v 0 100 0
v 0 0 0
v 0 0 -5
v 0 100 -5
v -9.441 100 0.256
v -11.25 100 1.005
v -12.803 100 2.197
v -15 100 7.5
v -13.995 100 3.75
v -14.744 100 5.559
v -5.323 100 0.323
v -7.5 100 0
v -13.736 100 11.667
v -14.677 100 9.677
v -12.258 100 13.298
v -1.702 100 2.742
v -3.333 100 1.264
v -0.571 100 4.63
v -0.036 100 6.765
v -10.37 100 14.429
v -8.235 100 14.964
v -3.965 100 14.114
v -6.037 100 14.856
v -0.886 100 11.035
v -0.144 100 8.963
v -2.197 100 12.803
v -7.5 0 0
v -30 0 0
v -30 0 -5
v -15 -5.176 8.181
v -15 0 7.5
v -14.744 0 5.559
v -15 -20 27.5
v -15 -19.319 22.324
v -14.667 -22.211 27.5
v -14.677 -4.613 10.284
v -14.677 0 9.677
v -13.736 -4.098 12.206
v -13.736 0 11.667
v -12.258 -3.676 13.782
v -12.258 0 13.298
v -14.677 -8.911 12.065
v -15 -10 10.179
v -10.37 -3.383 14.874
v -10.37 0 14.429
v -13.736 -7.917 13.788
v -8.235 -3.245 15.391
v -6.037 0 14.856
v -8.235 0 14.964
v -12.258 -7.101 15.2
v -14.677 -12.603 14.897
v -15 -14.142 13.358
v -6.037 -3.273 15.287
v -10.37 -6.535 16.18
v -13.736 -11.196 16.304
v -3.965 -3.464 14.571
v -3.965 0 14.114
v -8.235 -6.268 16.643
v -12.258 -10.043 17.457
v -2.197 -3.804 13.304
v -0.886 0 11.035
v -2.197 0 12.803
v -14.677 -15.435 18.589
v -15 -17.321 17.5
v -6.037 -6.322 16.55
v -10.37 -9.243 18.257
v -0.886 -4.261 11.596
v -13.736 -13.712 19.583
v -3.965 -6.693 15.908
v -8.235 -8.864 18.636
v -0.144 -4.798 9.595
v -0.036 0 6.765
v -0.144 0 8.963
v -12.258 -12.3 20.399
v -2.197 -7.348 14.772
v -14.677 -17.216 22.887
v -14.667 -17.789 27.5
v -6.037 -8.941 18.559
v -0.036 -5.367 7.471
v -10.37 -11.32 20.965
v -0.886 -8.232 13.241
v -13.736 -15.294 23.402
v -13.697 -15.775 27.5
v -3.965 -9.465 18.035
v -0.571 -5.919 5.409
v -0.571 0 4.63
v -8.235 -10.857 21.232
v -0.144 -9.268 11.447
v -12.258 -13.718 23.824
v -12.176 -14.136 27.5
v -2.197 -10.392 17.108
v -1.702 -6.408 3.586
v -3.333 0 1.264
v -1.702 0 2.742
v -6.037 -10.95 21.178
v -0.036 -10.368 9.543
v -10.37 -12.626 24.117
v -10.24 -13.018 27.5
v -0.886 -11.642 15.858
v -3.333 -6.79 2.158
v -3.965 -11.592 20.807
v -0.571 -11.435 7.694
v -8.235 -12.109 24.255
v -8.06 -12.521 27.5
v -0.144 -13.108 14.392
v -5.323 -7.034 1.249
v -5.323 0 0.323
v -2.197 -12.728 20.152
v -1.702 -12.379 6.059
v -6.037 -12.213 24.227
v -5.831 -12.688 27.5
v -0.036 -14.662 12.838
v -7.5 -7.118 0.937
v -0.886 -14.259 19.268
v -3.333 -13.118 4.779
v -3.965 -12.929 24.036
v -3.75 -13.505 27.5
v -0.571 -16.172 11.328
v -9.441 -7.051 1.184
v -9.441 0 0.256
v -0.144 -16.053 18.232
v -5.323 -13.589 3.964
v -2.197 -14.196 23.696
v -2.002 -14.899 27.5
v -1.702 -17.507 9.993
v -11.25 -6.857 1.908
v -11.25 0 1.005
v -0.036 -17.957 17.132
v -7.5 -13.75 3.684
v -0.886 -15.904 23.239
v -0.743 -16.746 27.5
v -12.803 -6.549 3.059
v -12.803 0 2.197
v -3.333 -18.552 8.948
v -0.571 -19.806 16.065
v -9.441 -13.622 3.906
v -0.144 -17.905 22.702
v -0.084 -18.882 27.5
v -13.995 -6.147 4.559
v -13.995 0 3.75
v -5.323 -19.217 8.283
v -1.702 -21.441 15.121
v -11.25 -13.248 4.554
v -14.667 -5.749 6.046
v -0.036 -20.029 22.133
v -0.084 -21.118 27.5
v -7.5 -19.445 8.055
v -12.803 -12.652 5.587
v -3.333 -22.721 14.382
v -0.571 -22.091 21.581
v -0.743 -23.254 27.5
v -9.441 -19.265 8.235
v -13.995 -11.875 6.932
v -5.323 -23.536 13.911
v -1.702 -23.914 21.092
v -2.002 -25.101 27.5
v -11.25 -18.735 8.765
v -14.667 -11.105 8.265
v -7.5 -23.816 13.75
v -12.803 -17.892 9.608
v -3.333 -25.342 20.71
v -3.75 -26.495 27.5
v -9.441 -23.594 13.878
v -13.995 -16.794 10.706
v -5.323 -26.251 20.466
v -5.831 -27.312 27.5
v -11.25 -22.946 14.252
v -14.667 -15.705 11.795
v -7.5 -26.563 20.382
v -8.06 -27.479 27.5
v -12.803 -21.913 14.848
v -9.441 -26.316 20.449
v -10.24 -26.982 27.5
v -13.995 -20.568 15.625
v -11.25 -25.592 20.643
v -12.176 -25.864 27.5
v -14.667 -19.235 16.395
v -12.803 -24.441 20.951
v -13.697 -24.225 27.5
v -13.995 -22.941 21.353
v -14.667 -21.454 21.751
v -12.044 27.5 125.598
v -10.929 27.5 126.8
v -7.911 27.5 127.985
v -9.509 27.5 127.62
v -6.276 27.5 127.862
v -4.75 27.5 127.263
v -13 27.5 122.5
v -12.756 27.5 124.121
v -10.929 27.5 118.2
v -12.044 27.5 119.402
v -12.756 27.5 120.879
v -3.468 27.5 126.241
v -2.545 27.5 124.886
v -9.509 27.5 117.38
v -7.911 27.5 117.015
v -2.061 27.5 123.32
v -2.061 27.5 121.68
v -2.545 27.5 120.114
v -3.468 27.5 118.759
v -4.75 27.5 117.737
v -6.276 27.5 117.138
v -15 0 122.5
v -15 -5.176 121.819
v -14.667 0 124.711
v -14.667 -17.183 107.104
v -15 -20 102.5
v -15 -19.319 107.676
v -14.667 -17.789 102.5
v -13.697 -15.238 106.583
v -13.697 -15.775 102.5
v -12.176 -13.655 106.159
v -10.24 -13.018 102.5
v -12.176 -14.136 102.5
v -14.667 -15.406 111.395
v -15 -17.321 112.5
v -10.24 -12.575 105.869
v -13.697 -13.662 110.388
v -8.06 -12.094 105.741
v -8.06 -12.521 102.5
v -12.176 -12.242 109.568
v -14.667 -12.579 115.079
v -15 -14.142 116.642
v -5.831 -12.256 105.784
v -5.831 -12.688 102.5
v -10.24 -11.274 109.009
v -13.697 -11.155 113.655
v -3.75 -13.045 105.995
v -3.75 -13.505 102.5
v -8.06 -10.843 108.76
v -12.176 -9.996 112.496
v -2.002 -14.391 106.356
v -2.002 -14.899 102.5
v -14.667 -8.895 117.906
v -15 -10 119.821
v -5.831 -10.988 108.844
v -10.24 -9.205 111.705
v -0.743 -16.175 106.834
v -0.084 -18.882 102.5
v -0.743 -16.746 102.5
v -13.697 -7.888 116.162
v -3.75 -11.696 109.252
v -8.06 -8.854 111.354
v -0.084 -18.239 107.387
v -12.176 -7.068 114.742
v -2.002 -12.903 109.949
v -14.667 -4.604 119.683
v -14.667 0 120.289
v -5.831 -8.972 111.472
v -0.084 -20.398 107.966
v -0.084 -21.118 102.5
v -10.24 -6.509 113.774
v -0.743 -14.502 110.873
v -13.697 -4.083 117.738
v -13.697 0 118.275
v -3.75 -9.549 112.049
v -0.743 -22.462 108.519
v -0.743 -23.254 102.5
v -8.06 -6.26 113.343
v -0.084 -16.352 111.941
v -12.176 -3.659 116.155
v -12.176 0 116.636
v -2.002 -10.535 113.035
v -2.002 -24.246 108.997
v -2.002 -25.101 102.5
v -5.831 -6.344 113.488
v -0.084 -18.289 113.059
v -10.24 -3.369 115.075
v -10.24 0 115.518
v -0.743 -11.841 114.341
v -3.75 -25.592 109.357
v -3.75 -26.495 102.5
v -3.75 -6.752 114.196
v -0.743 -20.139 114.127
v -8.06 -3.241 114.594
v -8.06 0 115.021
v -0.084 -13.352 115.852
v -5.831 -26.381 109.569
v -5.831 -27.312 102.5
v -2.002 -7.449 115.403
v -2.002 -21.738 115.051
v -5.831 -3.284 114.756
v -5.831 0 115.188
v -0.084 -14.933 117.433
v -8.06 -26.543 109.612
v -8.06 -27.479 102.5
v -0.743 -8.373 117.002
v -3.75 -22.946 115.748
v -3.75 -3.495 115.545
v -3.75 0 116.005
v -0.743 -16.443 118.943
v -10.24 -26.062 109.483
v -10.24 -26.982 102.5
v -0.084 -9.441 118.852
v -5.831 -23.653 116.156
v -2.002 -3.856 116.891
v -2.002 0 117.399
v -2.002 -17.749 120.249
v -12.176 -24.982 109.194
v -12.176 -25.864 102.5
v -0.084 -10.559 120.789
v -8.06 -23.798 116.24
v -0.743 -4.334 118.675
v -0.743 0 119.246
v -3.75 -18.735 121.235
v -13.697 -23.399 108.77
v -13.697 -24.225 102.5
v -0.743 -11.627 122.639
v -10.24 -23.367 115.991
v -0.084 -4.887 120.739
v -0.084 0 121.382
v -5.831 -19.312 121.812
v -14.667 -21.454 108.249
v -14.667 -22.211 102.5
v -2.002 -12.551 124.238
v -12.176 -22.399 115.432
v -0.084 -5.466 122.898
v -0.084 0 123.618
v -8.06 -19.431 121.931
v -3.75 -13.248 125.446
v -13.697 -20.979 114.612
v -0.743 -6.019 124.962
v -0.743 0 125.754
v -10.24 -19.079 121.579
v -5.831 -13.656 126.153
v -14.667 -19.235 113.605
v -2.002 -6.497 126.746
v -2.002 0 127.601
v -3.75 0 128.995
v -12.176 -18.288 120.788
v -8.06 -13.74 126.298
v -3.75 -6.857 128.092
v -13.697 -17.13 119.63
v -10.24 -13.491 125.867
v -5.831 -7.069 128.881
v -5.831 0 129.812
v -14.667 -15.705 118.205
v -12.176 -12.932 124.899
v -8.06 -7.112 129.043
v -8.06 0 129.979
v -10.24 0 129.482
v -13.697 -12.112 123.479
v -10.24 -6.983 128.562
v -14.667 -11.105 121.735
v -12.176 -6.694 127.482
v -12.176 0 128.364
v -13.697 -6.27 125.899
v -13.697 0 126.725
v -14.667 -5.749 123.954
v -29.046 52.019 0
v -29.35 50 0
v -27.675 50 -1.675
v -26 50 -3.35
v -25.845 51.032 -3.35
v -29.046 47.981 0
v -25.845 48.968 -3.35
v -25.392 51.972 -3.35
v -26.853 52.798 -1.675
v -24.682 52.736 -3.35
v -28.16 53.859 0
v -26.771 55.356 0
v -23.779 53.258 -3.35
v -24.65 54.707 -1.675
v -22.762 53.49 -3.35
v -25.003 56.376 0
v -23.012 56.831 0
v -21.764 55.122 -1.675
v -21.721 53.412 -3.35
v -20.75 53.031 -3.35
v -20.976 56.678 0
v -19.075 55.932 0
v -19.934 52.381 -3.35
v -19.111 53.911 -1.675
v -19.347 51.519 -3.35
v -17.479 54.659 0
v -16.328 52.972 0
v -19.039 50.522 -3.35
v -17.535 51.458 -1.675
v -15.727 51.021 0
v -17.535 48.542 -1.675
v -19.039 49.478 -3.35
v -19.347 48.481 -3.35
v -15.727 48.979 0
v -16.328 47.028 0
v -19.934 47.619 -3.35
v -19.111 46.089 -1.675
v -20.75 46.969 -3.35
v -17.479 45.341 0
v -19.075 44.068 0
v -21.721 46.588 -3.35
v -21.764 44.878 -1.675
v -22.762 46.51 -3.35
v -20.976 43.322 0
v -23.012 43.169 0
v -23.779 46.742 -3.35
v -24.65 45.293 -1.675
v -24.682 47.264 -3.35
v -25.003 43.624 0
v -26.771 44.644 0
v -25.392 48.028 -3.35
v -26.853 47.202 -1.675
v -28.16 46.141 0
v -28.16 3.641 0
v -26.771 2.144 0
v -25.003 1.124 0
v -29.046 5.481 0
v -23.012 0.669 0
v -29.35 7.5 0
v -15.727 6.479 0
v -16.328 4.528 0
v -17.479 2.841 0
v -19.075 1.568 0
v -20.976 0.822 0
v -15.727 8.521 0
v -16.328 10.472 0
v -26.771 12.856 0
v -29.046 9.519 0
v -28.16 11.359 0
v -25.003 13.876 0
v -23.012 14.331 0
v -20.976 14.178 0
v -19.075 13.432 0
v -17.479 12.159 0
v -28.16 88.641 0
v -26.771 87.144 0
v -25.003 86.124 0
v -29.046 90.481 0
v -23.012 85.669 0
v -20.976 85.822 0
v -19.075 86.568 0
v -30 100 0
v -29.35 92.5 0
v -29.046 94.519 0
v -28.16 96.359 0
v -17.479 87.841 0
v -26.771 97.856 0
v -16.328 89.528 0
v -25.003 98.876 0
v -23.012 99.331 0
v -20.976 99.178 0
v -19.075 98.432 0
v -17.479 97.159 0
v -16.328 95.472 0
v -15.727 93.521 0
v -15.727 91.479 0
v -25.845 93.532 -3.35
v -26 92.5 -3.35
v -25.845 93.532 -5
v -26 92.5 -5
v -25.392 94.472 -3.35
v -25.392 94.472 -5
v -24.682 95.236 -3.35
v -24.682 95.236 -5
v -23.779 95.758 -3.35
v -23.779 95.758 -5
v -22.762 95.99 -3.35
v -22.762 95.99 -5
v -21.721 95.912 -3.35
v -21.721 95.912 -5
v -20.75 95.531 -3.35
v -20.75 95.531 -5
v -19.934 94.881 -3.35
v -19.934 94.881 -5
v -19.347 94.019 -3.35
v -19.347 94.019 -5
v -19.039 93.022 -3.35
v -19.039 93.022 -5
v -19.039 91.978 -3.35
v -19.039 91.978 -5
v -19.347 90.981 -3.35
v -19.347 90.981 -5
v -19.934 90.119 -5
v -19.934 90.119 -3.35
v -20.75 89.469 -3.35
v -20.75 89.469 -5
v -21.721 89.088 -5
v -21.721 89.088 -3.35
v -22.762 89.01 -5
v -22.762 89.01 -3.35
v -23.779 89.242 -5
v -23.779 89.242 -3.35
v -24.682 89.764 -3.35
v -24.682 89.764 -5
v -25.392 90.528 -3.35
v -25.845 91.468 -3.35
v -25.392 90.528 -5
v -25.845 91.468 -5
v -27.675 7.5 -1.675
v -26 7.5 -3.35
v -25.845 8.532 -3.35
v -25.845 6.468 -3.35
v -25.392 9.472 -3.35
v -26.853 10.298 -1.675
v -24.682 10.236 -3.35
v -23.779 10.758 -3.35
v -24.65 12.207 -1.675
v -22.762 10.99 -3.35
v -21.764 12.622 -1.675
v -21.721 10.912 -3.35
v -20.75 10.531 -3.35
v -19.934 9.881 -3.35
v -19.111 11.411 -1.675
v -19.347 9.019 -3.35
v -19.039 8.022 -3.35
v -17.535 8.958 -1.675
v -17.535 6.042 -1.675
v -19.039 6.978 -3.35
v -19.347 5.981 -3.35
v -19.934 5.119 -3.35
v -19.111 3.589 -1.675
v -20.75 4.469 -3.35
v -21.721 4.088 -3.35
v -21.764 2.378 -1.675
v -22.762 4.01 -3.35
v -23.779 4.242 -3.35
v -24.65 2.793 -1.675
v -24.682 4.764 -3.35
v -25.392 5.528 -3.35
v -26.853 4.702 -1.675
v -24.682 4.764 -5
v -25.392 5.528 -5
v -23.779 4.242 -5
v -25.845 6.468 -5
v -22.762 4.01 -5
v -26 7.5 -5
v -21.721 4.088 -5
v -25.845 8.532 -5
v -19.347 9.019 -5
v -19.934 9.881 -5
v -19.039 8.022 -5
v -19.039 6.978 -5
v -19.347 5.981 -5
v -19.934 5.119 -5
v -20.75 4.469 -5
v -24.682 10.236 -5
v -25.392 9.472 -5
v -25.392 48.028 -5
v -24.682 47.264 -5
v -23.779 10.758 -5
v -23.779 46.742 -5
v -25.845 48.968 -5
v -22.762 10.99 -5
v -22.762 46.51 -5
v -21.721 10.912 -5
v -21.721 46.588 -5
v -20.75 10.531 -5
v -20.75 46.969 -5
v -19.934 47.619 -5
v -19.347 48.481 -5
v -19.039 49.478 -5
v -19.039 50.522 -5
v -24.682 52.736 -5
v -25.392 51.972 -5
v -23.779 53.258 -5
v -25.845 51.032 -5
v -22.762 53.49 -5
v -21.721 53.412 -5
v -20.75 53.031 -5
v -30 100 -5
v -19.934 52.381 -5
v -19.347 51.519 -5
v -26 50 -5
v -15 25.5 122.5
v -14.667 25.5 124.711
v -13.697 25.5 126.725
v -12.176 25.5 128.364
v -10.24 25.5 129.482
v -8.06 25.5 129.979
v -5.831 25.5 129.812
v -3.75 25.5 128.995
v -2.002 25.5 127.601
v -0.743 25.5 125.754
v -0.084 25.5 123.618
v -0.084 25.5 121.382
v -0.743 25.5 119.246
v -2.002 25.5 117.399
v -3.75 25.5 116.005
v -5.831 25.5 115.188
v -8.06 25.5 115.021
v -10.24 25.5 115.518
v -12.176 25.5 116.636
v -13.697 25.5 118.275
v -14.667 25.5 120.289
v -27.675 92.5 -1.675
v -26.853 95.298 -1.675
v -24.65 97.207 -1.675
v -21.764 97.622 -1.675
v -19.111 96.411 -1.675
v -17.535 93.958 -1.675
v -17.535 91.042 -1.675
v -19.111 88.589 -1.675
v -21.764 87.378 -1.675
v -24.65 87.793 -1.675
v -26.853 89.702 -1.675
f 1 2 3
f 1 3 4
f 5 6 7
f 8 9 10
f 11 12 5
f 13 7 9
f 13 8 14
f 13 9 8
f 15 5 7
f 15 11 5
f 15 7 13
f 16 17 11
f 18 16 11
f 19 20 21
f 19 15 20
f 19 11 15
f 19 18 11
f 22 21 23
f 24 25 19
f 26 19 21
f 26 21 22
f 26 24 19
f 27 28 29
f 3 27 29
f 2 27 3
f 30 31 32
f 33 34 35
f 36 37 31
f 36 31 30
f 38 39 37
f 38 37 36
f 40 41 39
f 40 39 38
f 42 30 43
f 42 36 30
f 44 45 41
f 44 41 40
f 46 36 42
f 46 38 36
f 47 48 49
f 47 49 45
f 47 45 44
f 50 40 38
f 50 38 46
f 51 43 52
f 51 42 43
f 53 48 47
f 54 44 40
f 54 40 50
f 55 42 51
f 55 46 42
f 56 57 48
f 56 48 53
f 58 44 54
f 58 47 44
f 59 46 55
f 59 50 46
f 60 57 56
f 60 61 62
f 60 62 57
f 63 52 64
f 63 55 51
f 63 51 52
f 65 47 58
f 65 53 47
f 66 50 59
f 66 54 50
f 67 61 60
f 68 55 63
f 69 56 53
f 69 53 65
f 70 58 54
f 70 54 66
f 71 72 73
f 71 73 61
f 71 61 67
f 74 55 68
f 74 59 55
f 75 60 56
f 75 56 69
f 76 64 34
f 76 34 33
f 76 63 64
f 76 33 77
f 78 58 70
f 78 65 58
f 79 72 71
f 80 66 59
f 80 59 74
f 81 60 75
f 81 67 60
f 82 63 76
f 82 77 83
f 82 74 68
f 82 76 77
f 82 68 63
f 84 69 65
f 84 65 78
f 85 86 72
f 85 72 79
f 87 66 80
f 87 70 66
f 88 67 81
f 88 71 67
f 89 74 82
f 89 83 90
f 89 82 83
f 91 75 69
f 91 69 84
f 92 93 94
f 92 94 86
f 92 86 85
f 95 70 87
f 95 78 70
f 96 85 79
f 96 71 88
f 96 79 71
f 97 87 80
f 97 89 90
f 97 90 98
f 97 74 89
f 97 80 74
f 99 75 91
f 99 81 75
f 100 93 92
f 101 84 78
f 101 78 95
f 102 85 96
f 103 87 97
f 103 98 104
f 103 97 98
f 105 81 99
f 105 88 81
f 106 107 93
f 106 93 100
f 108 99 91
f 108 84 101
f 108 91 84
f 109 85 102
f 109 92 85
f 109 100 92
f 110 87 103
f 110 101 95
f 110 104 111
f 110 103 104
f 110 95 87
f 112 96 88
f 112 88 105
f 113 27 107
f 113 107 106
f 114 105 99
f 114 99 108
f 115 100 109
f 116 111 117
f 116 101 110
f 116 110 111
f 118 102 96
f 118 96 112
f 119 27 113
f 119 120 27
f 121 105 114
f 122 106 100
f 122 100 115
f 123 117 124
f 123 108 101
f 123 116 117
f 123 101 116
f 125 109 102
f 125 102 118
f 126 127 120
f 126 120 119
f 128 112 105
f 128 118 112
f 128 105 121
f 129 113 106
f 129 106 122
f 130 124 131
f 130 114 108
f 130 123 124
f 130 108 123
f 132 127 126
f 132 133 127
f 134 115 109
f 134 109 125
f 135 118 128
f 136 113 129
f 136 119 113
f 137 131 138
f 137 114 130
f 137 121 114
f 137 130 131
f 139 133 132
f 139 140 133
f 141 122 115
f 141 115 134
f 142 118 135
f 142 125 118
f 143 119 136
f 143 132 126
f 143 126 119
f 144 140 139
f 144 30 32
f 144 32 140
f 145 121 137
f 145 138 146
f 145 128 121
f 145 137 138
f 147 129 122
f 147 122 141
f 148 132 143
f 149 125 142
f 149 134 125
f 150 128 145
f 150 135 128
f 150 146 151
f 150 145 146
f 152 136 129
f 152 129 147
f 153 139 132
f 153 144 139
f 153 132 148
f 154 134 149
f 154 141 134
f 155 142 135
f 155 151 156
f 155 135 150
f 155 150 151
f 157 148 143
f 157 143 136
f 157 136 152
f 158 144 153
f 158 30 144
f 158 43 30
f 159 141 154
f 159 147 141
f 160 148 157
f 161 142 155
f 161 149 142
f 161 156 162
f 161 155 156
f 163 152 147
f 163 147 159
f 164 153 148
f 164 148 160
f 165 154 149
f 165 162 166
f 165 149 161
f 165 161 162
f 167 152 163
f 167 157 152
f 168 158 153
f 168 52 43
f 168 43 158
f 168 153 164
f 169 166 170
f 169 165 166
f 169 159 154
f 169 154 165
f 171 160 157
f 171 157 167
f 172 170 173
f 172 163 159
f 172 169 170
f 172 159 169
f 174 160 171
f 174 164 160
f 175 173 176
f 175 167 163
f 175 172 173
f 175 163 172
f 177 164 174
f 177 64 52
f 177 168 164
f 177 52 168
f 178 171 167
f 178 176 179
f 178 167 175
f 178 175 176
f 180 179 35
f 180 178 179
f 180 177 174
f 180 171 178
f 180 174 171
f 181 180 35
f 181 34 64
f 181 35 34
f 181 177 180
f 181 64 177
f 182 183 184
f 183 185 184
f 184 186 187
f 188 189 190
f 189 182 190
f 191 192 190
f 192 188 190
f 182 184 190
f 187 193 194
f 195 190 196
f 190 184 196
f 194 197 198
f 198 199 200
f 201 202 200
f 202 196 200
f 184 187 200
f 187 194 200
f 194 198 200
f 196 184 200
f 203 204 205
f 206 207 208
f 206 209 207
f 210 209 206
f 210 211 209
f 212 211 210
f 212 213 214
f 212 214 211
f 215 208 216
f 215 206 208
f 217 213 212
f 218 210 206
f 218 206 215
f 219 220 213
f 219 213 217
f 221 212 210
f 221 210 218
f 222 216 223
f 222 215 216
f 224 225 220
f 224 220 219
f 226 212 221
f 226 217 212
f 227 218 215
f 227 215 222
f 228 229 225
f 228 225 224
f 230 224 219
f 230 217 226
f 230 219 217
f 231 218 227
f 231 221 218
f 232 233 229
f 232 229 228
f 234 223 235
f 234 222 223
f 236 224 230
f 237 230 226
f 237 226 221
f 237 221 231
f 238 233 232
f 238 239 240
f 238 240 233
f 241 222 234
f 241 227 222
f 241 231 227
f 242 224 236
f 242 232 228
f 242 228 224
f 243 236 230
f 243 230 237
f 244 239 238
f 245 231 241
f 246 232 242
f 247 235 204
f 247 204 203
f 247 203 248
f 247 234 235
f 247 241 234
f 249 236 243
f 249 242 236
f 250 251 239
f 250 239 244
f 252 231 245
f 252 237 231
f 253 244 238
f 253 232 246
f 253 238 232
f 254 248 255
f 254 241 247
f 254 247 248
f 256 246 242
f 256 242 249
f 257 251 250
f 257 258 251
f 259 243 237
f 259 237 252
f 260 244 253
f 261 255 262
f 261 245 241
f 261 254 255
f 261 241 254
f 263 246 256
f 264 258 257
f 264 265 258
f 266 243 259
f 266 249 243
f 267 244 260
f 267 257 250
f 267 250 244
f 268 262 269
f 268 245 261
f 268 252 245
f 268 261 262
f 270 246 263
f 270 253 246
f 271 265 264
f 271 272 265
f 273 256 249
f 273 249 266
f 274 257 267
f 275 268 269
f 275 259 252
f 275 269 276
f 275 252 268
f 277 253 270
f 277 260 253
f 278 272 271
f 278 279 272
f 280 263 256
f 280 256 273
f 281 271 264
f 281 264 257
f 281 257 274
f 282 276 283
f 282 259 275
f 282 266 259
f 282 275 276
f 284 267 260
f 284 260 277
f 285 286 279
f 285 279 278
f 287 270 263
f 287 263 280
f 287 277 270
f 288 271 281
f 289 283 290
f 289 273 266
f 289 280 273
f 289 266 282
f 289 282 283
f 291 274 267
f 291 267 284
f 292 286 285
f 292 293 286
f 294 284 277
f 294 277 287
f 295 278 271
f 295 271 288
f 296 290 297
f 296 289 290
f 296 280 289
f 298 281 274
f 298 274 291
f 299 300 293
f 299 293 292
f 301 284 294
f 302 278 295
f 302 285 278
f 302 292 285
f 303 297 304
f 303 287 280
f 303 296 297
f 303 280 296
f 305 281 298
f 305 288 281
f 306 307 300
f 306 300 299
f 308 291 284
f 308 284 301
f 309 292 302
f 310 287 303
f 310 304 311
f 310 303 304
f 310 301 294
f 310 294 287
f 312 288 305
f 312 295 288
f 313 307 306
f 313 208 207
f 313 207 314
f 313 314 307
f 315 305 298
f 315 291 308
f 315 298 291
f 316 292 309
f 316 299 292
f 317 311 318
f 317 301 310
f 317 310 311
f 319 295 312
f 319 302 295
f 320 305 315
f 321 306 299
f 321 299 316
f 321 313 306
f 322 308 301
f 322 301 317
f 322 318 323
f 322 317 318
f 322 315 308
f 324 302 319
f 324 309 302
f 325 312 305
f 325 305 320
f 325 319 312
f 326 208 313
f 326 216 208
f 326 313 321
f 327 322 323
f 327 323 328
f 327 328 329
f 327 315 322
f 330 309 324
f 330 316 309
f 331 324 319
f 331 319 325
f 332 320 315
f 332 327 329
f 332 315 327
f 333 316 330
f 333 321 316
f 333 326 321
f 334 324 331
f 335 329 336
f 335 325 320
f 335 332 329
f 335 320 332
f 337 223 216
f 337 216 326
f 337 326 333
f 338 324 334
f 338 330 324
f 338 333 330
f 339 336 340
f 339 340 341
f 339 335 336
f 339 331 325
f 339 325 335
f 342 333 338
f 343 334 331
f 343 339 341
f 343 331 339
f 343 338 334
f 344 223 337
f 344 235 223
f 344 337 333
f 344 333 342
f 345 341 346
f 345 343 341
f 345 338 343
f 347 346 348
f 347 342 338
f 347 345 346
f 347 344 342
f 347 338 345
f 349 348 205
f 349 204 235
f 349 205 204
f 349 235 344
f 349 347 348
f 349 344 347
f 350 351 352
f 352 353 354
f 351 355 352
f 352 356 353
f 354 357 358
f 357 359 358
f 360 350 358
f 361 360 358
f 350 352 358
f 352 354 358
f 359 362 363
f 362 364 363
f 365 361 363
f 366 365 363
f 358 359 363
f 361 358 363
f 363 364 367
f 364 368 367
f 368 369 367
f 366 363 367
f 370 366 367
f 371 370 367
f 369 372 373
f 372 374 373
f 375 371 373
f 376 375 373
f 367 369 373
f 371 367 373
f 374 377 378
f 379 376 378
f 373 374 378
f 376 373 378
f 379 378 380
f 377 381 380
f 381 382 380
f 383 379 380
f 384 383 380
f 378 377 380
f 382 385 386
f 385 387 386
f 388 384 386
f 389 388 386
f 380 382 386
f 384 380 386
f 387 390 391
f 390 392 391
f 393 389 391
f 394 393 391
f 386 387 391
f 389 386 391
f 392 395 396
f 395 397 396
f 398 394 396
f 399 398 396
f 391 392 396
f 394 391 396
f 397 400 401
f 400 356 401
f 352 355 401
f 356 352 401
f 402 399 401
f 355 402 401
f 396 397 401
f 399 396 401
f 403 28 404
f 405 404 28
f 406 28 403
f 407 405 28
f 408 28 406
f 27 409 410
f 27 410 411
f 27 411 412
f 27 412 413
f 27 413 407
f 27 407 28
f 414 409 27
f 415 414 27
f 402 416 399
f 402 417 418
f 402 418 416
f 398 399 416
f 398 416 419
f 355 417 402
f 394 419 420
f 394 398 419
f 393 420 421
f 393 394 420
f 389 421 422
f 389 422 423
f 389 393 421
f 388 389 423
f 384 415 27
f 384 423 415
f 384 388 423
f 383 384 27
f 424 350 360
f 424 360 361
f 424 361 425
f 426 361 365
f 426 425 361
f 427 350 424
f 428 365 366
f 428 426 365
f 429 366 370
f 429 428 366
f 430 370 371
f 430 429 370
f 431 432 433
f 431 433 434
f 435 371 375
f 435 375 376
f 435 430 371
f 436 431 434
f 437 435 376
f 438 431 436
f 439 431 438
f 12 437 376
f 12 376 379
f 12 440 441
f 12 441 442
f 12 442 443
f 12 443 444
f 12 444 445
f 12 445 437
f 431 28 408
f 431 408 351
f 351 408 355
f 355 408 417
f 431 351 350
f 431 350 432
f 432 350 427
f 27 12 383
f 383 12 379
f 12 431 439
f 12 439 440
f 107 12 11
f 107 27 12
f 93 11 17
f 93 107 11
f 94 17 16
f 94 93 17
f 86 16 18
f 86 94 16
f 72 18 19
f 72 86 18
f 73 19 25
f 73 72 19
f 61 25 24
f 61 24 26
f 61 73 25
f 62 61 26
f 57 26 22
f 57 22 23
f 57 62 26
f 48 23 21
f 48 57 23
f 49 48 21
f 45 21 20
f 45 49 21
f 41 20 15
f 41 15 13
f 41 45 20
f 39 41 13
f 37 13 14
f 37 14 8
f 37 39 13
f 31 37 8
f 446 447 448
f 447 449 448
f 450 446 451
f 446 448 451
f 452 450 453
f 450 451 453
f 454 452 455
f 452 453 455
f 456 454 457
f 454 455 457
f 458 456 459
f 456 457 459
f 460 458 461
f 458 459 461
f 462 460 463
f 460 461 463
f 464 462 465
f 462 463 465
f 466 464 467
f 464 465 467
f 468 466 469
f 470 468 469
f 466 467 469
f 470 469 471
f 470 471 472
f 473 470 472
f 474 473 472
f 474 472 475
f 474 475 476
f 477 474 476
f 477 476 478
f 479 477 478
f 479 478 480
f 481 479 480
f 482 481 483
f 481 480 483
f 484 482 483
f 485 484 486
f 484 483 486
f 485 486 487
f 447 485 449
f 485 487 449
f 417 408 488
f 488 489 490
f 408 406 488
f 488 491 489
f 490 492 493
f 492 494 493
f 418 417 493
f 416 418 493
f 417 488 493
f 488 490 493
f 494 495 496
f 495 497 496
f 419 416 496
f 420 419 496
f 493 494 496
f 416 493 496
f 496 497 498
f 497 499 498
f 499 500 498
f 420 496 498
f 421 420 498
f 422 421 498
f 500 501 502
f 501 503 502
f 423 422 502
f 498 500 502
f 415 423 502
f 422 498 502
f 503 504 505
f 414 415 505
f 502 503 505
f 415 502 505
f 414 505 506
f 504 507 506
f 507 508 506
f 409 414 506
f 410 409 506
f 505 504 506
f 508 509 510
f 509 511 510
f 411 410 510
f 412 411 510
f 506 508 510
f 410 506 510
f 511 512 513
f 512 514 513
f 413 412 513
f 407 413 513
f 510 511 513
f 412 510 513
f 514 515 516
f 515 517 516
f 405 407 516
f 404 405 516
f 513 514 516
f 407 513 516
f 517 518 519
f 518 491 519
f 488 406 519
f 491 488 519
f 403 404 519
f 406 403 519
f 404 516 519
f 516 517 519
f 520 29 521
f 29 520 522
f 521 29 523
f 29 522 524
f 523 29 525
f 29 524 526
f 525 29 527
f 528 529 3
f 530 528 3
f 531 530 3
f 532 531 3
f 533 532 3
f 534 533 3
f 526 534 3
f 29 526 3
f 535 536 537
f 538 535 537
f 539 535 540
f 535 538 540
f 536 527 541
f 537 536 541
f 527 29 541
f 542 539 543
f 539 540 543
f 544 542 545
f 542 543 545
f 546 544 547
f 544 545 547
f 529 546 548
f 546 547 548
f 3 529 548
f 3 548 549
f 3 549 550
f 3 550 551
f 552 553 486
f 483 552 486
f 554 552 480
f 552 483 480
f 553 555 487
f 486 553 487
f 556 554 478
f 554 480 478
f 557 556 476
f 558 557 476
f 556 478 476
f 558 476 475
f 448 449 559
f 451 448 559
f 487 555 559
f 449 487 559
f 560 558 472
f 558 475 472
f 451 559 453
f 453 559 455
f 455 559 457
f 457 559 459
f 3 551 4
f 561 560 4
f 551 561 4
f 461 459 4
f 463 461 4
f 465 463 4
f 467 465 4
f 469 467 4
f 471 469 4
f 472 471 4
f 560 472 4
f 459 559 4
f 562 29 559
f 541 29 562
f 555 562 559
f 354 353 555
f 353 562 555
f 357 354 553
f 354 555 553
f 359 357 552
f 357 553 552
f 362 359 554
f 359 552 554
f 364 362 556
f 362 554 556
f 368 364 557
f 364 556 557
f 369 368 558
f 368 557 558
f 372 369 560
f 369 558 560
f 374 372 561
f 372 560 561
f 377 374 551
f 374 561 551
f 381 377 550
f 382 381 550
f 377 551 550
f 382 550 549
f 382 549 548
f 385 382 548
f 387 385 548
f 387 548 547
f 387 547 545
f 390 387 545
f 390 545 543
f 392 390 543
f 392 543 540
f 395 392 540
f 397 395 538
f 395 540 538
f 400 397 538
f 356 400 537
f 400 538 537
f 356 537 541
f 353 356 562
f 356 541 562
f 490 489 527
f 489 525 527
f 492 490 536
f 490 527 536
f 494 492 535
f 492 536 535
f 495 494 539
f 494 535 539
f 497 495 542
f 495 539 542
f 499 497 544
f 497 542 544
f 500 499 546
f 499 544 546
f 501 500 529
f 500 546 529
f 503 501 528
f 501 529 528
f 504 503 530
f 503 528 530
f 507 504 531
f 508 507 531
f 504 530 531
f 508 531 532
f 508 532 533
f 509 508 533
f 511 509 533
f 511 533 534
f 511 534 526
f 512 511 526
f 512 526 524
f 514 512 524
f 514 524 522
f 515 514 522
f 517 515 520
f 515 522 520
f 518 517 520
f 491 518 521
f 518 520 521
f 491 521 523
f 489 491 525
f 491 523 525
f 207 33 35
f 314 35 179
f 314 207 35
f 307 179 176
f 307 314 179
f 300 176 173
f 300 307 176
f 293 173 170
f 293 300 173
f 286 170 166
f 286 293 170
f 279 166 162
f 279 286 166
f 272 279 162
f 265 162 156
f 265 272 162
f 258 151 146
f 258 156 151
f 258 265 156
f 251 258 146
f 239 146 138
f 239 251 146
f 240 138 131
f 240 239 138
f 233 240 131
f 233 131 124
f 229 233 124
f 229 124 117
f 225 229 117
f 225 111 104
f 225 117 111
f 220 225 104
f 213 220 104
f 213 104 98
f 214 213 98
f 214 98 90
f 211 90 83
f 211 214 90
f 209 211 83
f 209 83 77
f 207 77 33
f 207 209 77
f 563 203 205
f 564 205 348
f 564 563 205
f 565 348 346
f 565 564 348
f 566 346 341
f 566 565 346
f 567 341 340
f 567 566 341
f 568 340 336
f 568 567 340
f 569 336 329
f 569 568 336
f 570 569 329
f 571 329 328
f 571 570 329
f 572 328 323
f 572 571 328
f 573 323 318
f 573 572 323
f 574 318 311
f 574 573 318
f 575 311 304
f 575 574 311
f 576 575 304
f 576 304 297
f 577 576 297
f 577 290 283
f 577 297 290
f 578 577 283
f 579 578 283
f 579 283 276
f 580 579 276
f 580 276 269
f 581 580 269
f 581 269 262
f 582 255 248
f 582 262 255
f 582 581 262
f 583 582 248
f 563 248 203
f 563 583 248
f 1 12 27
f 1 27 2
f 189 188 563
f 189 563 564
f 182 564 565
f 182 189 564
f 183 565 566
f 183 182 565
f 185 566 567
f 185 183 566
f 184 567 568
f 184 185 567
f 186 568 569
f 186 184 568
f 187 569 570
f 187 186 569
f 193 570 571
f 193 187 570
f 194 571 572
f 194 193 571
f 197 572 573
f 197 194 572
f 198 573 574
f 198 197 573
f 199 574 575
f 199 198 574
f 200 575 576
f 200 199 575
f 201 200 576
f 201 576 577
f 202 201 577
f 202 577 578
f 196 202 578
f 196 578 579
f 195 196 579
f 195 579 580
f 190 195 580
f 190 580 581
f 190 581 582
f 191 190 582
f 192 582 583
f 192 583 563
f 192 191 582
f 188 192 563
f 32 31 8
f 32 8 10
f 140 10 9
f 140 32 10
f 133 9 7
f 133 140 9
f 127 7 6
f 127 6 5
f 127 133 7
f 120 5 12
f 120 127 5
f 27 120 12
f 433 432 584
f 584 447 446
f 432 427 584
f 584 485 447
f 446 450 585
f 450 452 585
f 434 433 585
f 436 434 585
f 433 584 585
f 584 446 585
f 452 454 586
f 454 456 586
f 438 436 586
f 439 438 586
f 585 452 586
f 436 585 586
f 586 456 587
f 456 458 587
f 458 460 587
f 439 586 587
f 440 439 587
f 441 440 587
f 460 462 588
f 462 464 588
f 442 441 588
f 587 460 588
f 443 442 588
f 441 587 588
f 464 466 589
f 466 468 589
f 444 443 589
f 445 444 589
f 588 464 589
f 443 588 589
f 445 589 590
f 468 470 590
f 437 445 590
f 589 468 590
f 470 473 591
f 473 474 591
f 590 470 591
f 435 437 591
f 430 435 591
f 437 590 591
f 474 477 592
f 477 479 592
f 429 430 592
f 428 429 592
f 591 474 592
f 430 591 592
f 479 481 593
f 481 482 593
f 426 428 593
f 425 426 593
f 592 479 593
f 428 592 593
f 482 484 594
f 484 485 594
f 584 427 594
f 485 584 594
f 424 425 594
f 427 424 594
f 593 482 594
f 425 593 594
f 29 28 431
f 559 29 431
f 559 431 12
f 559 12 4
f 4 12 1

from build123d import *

# Parameters (mm, degrees)
F0_W           = 30
F0_H           = 100
F0_R           = 3
F1_DEPTH       = 5
F5_D           = 7
F5_CSINK_D     = 13.7
F5_CSINK_ANGLE = 90
F6_SIZE        = 2


with BuildPart() as f1:
    # F0 (on Top) → F1 (new body)
    with BuildSketch(Plane.XY):
        with Locations((-15, 50)):
            Rectangle(F0_W, F0_H)
        with Locations((-22.5, 7.5)):
            Circle(F0_R, mode=Mode.SUBTRACT)
        with Locations((-22.5, 50)):
            Circle(F0_R, mode=Mode.SUBTRACT)
        with Locations((-22.5, 92.5)):
            Circle(F0_R, mode=Mode.SUBTRACT)
        with Locations((-22.5, 92.5)):
            Circle(F0_R)
        with Locations((-22.5, 50)):
            Circle(F0_R)
        with Locations((-22.5, 7.5)):
            Circle(F0_R)
    extrude(amount=-F1_DEPTH)

    # F4: sweep along a path in F3
    with BuildLine(Plane(origin=(-30, 0, 0), x_dir=(0, -1, 0), z_dir=(-1, 0, 0))) as f4_path:
        Line((-100, 7.5), (0, 7.5))
        ThreePointArc((0, 7.5), (14.1421356237, 13.3578643763), (20, 27.5))
        Line((20, 27.5), (20, 102.5))
        ThreePointArc((20, 102.5), (14.1421356237, 116.6421356237), (0, 122.5))
        Line((0, 122.5), (-27.5, 122.5))
    # F2 (on face) → F4 (sweep)
    with BuildSketch(Plane(origin=(0, 100, 0), x_dir=(-1, 0, 0), z_dir=(0, 1, 0))):
        with BuildLine():
            ThreePointArc((7.5, 0), (12.8033008589, 2.1966991411), (15, 7.5))
            ThreePointArc((15, 7.5), (2.1966991411, 12.8033008589), (7.5, 0))
        make_face()
    sweep(path=f4_path.line)

    # F5 (through all)
    with Locations(Plane.XY):
        with Locations((-22.5, 92.5), (-22.5, 50), (-22.5, 7.5)):
            CounterSinkHole(F5_D / 2, F5_CSINK_D / 2, counter_sink_angle=F5_CSINK_ANGLE)

    # F6
    f6_edges = [f1.edges().sort_by_distance(p)[0] for p in [
        (-7.5, 27.5, 115),
    ]]
    chamfer(f6_edges, length=F6_SIZE)


solid = f1.part
